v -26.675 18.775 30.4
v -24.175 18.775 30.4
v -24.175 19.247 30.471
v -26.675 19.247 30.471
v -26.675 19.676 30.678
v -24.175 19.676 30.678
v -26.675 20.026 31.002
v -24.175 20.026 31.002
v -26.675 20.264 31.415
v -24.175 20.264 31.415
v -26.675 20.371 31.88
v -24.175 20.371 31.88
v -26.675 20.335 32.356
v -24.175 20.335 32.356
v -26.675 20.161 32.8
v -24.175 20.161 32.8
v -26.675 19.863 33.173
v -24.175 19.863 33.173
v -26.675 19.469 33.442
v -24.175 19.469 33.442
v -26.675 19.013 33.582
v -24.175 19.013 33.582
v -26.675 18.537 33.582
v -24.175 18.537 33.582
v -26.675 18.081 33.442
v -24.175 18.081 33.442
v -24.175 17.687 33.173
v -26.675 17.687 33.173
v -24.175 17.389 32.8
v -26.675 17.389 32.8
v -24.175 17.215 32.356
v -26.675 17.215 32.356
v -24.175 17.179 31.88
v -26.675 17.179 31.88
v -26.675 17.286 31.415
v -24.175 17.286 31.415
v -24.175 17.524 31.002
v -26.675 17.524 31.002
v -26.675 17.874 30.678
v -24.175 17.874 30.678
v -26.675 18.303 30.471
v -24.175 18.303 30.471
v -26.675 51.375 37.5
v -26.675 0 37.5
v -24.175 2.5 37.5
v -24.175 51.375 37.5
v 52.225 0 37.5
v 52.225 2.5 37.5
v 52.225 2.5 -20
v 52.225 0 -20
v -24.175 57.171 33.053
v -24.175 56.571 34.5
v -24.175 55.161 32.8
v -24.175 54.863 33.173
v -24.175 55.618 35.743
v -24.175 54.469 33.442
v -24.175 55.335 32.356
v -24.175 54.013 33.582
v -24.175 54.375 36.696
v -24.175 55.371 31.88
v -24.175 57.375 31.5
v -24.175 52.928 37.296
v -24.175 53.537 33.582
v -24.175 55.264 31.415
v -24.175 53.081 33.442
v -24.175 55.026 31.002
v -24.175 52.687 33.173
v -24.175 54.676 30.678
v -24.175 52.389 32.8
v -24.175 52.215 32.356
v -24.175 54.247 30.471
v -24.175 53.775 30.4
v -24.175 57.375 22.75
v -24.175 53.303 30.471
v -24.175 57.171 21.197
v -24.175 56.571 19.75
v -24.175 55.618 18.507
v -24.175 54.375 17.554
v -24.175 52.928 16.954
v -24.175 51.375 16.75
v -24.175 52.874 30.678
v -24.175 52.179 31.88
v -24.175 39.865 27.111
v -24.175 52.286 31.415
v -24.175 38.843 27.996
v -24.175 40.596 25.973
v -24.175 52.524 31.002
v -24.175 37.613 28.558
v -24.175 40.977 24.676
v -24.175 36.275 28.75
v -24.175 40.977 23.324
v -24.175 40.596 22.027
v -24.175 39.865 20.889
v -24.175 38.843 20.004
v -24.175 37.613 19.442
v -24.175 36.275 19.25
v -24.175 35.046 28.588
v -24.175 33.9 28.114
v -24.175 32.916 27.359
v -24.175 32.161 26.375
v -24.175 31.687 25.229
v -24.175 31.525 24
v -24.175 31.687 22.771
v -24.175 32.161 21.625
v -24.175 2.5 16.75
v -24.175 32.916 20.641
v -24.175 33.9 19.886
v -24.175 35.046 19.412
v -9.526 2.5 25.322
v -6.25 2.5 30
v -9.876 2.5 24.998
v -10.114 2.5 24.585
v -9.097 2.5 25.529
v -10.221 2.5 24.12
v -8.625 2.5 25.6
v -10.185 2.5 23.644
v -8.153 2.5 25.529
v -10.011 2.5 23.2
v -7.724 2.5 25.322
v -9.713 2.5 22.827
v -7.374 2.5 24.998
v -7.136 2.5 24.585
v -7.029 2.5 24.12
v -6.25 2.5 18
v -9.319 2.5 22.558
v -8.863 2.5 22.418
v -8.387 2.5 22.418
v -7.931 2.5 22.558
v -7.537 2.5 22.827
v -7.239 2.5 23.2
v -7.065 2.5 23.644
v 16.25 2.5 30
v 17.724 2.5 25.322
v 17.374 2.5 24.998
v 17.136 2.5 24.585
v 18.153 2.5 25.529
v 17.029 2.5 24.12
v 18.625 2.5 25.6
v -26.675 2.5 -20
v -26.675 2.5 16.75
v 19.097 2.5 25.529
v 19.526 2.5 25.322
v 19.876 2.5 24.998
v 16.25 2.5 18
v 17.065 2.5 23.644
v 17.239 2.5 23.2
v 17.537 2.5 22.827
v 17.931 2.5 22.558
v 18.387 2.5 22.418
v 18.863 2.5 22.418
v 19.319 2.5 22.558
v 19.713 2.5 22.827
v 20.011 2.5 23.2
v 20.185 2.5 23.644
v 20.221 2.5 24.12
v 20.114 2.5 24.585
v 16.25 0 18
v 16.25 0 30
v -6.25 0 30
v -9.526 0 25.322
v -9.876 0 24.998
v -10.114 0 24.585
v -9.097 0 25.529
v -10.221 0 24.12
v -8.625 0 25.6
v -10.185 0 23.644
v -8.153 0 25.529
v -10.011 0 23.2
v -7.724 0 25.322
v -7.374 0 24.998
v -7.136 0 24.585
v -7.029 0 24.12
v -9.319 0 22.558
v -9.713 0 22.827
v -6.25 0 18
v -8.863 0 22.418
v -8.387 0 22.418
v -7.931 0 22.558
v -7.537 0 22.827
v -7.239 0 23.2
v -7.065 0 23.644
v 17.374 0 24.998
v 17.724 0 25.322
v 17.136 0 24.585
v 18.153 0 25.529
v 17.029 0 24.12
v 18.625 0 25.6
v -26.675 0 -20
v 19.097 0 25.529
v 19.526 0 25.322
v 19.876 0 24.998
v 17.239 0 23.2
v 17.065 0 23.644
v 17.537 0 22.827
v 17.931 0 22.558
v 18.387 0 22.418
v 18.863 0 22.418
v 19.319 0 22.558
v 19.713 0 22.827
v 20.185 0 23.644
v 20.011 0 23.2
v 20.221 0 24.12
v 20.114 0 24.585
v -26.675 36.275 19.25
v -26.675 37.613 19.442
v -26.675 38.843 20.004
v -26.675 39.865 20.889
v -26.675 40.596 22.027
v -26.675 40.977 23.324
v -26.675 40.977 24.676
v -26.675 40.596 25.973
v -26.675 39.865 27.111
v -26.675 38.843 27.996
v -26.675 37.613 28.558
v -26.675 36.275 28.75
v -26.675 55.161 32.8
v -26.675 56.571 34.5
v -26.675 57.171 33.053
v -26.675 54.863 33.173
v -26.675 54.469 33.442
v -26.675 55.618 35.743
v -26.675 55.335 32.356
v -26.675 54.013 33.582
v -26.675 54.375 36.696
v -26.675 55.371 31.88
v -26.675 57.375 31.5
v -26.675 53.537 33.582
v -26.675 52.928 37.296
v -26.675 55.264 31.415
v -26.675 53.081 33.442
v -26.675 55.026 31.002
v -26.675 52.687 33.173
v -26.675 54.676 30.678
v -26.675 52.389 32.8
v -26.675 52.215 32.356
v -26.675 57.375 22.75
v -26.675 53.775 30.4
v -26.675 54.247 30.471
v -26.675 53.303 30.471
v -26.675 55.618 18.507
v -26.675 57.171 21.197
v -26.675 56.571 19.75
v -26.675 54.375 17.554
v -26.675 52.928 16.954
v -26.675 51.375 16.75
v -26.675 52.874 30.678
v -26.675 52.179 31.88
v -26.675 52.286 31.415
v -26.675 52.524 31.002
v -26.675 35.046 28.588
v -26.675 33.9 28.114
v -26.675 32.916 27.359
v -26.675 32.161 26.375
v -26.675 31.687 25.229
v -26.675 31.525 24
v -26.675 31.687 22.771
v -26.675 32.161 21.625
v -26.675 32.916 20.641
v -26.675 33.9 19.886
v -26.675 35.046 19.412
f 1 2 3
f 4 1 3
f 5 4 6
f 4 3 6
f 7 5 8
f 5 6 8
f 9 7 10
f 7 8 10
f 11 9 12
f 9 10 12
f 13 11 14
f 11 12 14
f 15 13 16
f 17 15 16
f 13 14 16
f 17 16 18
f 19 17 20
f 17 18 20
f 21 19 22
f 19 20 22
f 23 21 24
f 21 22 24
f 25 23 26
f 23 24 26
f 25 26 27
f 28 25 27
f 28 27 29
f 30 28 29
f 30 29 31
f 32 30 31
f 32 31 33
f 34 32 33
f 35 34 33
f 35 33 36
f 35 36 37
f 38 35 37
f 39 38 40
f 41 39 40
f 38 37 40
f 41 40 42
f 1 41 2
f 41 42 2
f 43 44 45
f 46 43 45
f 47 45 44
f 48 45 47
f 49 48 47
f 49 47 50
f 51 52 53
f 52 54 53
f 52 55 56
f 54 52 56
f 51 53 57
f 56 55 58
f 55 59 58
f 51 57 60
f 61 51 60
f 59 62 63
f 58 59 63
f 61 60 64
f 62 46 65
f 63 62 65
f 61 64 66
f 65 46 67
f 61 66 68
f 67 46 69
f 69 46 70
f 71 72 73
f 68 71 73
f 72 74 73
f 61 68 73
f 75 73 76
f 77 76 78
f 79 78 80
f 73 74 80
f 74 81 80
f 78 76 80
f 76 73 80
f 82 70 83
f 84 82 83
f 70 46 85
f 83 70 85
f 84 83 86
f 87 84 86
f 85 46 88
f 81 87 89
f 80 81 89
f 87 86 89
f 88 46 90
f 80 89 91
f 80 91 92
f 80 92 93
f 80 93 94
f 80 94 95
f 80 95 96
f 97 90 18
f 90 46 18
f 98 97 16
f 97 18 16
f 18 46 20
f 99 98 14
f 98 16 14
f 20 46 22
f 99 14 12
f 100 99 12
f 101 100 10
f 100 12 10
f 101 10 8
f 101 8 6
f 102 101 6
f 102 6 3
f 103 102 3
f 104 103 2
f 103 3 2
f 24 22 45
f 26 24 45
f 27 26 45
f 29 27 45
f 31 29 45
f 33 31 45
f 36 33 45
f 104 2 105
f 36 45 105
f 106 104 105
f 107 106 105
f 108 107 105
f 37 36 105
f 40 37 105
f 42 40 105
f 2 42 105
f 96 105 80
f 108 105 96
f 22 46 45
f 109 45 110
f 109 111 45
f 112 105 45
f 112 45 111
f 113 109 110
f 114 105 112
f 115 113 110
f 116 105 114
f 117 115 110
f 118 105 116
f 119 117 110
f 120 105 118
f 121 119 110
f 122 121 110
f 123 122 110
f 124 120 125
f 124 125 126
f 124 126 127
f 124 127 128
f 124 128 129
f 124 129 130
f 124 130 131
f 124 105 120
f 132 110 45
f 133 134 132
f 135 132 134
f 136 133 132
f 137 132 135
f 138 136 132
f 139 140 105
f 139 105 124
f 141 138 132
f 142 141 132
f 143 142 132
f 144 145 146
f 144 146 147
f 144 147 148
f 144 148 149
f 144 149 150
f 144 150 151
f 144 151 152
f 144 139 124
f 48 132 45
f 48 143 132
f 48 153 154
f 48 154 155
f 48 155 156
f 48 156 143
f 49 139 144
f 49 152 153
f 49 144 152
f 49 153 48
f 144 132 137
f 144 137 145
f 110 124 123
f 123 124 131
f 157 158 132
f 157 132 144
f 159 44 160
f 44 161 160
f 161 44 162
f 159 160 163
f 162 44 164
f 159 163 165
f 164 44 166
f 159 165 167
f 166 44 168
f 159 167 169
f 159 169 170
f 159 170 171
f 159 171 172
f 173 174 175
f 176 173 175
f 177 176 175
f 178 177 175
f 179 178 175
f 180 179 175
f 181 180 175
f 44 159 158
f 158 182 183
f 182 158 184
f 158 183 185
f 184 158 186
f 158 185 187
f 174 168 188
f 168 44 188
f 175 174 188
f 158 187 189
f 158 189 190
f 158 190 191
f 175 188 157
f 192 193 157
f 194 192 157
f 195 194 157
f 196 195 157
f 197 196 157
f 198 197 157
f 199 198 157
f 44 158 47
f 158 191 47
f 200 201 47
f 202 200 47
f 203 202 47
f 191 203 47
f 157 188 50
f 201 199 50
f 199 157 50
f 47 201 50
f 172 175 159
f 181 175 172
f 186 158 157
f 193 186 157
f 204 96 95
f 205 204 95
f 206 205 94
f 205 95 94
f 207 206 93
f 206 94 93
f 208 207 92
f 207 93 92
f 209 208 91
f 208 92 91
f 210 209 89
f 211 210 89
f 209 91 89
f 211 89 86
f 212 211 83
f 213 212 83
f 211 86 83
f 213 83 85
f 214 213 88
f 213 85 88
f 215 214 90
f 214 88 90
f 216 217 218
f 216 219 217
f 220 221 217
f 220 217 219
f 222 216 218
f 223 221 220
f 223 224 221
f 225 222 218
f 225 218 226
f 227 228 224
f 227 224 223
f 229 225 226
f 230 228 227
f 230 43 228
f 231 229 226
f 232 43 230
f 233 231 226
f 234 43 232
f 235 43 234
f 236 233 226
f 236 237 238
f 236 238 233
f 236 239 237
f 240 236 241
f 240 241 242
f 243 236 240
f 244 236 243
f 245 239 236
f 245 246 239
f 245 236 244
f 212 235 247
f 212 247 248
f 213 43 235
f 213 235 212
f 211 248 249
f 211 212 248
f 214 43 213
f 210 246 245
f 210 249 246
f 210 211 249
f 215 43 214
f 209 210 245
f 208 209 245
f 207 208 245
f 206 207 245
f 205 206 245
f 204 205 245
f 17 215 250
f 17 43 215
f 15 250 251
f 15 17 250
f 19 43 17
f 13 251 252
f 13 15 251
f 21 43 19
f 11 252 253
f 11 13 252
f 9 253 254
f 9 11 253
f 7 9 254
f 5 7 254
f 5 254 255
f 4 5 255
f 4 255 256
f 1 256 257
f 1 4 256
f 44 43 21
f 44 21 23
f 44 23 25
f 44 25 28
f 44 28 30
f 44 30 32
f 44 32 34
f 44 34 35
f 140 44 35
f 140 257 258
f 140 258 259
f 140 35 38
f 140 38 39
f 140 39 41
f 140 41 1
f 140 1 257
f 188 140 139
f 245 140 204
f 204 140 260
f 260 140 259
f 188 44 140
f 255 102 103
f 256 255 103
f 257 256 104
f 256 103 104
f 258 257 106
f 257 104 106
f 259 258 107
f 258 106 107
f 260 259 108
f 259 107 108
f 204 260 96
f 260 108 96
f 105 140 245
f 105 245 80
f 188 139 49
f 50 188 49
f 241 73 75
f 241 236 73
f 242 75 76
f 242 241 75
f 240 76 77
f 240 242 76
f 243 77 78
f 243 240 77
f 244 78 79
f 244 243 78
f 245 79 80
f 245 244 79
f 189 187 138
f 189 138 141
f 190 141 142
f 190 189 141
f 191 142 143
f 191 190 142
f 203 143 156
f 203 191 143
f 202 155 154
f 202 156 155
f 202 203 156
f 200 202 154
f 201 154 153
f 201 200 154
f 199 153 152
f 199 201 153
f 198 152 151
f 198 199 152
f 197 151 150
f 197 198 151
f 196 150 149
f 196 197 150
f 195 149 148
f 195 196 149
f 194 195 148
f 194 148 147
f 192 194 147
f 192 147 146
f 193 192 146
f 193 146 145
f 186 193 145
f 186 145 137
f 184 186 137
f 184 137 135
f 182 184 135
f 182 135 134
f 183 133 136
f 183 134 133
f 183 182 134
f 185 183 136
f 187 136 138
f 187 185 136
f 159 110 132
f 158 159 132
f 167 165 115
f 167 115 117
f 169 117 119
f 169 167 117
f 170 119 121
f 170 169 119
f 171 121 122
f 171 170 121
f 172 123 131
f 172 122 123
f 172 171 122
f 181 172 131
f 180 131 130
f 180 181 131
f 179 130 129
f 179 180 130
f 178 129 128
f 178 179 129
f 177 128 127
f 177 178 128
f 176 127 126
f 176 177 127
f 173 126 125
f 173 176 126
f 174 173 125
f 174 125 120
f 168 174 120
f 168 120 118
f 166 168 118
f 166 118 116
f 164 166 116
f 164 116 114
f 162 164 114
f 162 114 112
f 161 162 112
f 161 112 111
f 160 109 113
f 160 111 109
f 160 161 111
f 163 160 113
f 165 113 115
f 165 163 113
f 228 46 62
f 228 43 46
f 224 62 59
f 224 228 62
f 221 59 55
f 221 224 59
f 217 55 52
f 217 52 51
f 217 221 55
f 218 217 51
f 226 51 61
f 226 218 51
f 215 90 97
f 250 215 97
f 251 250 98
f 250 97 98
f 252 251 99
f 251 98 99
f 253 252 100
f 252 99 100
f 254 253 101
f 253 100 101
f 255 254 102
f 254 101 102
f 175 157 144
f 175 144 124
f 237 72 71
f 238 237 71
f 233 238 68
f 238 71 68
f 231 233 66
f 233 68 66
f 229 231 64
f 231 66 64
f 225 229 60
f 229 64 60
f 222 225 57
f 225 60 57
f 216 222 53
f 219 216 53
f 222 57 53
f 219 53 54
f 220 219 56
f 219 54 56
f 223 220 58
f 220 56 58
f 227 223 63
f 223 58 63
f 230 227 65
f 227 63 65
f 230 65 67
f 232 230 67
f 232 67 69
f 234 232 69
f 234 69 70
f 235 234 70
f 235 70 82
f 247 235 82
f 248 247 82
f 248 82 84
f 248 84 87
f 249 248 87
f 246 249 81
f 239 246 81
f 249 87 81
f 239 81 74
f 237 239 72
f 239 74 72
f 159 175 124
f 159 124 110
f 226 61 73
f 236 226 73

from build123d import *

# Parameters (mm, degrees)
SKETCH1_W               = 80
SKETCH1_H               = 60
BOSS_EXTRUDE1_DEPTH     = 2.5
CUT_EXTRUDE4_DEPTH      = 51.062460986
CUT_EXTRUDE4_DEPTH_BACK = 51.062460986
SKETCH2_R               = 1.6
SKETCH3_W               = 2.5
SKETCH3_H               = 20.5
BOSS_EXTRUDE2_DEPTH     = 66.5
SKETCH4_W               = 80
SKETCH4_H               = 5.5
BOSS_EXTRUDE3_DEPTH     = 2.5
SKETCH5_W               = 2.5
SKETCH5_H               = 5.5
BOSS_EXTRUDE4_DEPTH     = 66.5
SKETCH6_W               = 2.5
SKETCH6_H               = 5.5
CUT_EXTRUDE5_DEPTH      = 66.5
SKETCH9_W               = 2.5
SKETCH9_H               = 2.5
BOSS_EXTRUDE5_DEPTH     = 66.5
SKETCH11_R              = 4.75
CUT_EXTRUDE6_DEPTH      = 2.5
SKETCH15_W              = 2.5
SKETCH15_H              = 23
BOSS_EXTRUDE6_DEPTH     = 8
SKETCH17_W              = 2.5
SKETCH17_H              = 74.5
BOSS_EXTRUDE7_DEPTH     = 2
SKETCH18_R              = 1.6
CUT_EXTRUDE7_DEPTH      = 2.5
SKETCH21_W              = 80
SKETCH21_H              = 2.5
BOSS_EXTRUDE8_DEPTH     = 2
SKETCH22_W              = 4.25
SKETCH22_H              = 74.5
CUT_EXTRUDE8_DEPTH      = 2.5
FILLET1_R               = 5
SKETCH23_W              = 15.225
SKETCH23_H              = 67.5
BOSS_EXTRUDE10_DEPTH    = 2.5
SKETCH24_W              = 95.225
SKETCH24_H              = 10
CUT_EXTRUDE9_DEPTH      = 101.031498164
SKETCH26_W              = 2.5
SKETCH26_H              = 20.75
BOSS_EXTRUDE11_DEPTH    = 74.5
SKETCH27_R              = 1.6
CUT_EXTRUDE10_DEPTH     = 2.5
SKETCH28_W              = 2.5
SKETCH28_H              = 20.75
CUT_EXTRUDE11_DEPTH     = 74.5
SKETCH29_W              = 20.75
SKETCH29_H              = 19.625
CUT_EXTRUDE12_DEPTH     = 2.5
FILLET2_R               = 6
SKETCH31_W              = 13.325
SKETCH31_H              = 57.5
CUT_EXTRUDE13_DEPTH     = 2.5
SKETCH33_W              = 3
SKETCH33_H              = 57.5
CUT_EXTRUDE14_DEPTH     = 2.5


with BuildPart() as part:
    # Sketch1 → Boss-Extrude1 (new body)
    with BuildSketch(Plane(origin=(0, 0, 0), x_dir=(1, 0, 0), z_dir=(0, 1, 0))):
        Rectangle(SKETCH1_W, SKETCH1_H)
    extrude(amount=BOSS_EXTRUDE1_DEPTH)

    # Sketch2 → Cut-Extrude4 (cut, two sides: drawn at the far end of the back side and taken through both)
    with BuildSketch(Plane(origin=(0, 0, 0), x_dir=(1, 0, 0), z_dir=(0, 1, 0)).offset(-CUT_EXTRUDE4_DEPTH_BACK)):
        with BuildLine():
            Line((-6.25, -24), (-2.5, -24))
            ThreePointArc((-2.5, -24), (0, -21.5), (2.5, -24))
            Line((2.5, -24), (16.25, -24))
            Line((16.25, -24), (16.25, -18))
            Line((16.25, -18), (-6.25, -18))
            Line((-6.25, -18), (-6.25, -24))
        make_face()
        with BuildLine():
            Line((0, -26.5), (0, -30))
            Line((0, -30), (16.25, -30))
            Line((16.25, -30), (16.25, -24))
            Line((16.25, -24), (2.5, -24))
            ThreePointArc((2.5, -24), (1.767766953, -25.767766953), (0, -26.5))
        make_face()
        with BuildLine():
            ThreePointArc((-2.5, -24), (-1.767766953, -25.767766953), (0, -26.5))
            Line((0, -26.5), (0, -24))
            Line((0, -24), (-2.5, -24))
        make_face()
        with BuildLine():
            Line((0, -24), (0, -26.5))
            ThreePointArc((0, -26.5), (1.767766953, -25.767766953), (2.5, -24))
            Line((2.5, -24), (0, -24))
        make_face()
        with BuildLine():
            Line((-2.5, -24), (0, -24))
            Line((0, -24), (2.5, -24))
            ThreePointArc((2.5, -24), (0, -21.5), (-2.5, -24))
        make_face()
        with BuildLine():
            ThreePointArc((-2.5, -24), (-1.767766953, -25.767766953), (0, -26.5))
            Line((0, -26.5), (0, -24))
            Line((0, -24), (-2.5, -24))
        make_face()
        with BuildLine():
            Line((0, -24), (0, -26.5))
            ThreePointArc((0, -26.5), (1.767766953, -25.767766953), (2.5, -24))
            Line((2.5, -24), (0, -24))
        make_face()
        with BuildLine():
            Line((-6.25, -30), (0, -30))
            Line((0, -30), (0, -26.5))
            ThreePointArc((0, -26.5), (-1.767766953, -25.767766953), (-2.5, -24))
            Line((-2.5, -24), (-6.25, -24))
            Line((-6.25, -24), (-6.25, -30))
        make_face()
        with Locations(Location((-8.625, -24, 0), (0, 0, 270))):
            Circle(SKETCH2_R)
        with Locations(Location((18.625, -24, 0), (0, 0, 270))):
            Circle(SKETCH2_R)
    extrude(amount=CUT_EXTRUDE4_DEPTH + CUT_EXTRUDE4_DEPTH_BACK, mode=Mode.SUBTRACT)

    # Sketch3 → Boss-Extrude2 (add)
    with BuildSketch(Plane(origin=(0, 2.5, 0), x_dir=(1, 0, 0), z_dir=(0, 1, 0))):
        with Locations((-38.75, -19.75)):
            Rectangle(SKETCH3_W, SKETCH3_H)
    extrude(amount=BOSS_EXTRUDE2_DEPTH)

    # Sketch4 → Boss-Extrude3 (add)
    with BuildSketch(Plane(origin=(0, 2.5, 0), x_dir=(1, 0, 0), z_dir=(0, 1, 0))):
        with Locations((0, -32.75)):
            Rectangle(SKETCH4_W, SKETCH4_H)
    extrude(amount=-BOSS_EXTRUDE3_DEPTH)

    # Sketch5 → Boss-Extrude4 (add)
    with BuildSketch(Plane(origin=(0, 2.5, 0), x_dir=(1, 0, 0), z_dir=(0, 1, 0))):
        with Locations((-38.75, -32.75)):
            Rectangle(SKETCH5_W, SKETCH5_H)
    extrude(amount=BOSS_EXTRUDE4_DEPTH)

    # Sketch6 → Cut-Extrude5 (cut)
    with BuildSketch(Plane(origin=(0, 69, 0), x_dir=(1, 0, 0), z_dir=(0, 1, 0))):
        with Locations((-38.75, -12.25)):
            Rectangle(SKETCH6_W, SKETCH6_H)
    extrude(amount=-CUT_EXTRUDE5_DEPTH, mode=Mode.SUBTRACT)

    # Sketch9 → Boss-Extrude5 (add)
    with BuildSketch(Plane(origin=(0, 2.5, 0), x_dir=(1, 0, 0), z_dir=(0, 1, 0))):
        with Locations((-38.75, -13.75)):
            Rectangle(SKETCH9_W, SKETCH9_H)
    extrude(amount=BOSS_EXTRUDE5_DEPTH)

    # Sketch11 → Cut-Extrude6 (cut)
    with BuildSketch(Plane(origin=(-37.5, 0, 0), x_dir=(0, 0, -1), z_dir=(1, 0, 0))):
        with Locations((-24, 54)):
            Circle(SKETCH11_R)
    extrude(amount=-CUT_EXTRUDE6_DEPTH, mode=Mode.SUBTRACT)

    # Sketch15 → Boss-Extrude6 (add)
    with BuildSketch(Plane(origin=(0, 69, 0), x_dir=(1, 0, 0), z_dir=(0, 1, 0))):
        with Locations((-38.75, -24)):
            Rectangle(SKETCH15_W, SKETCH15_H)
    extrude(amount=BOSS_EXTRUDE6_DEPTH)

    # Sketch17 → Boss-Extrude7 (add)
    with BuildSketch(Plane.XY.offset(35.5)):
        with Locations((-38.75, 39.75)):
            Rectangle(SKETCH17_W, SKETCH17_H)
    extrude(amount=BOSS_EXTRUDE7_DEPTH)

    # Sketch18 → Cut-Extrude7 (cut)
    with BuildSketch(Plane.ZY.offset(40)):
        with Locations((32, 36.5)):
            Circle(SKETCH18_R)
        with Locations((32, 71.5)):
            Circle(SKETCH18_R)
    extrude(amount=-CUT_EXTRUDE7_DEPTH, mode=Mode.SUBTRACT)

    # Sketch21 → Boss-Extrude8 (add)
    with BuildSketch(Plane.XY.offset(35.5)):
        with Locations((0, 1.25)):
            Rectangle(SKETCH21_W, SKETCH21_H)
    extrude(amount=BOSS_EXTRUDE8_DEPTH)

    # Sketch22 → Cut-Extrude8 (cut)
    with BuildSketch(Plane(origin=(-37.5, 0, 0), x_dir=(0, 0, -1), z_dir=(1, 0, 0))):
        with Locations((-14.625, 39.75)):
            Rectangle(SKETCH22_W, SKETCH22_H)
    extrude(amount=-CUT_EXTRUDE8_DEPTH, mode=Mode.SUBTRACT)

    # Fillet1
    fillet1_edges = [part.edges().sort_by_distance(p)[0] for p in [
        (-38.75, 77, 37.5),
        (-38.75, 77, 16.75),
    ]]
    fillet(fillet1_edges, radius=FILLET1_R)

    # Sketch23 → Boss-Extrude10 (add)
    with BuildSketch(Plane(origin=(0, 2.5, 0), x_dir=(1, 0, 0), z_dir=(0, 1, 0))):
        with Locations((47.6125, -3.75)):
            Rectangle(SKETCH23_W, SKETCH23_H)
    extrude(amount=-BOSS_EXTRUDE10_DEPTH)

    # Sketch24 → Cut-Extrude9 (cut, through all)
    with BuildSketch(Plane(origin=(0, 2.5, 0), x_dir=(1, 0, 0), z_dir=(0, 1, 0))):
        with Locations((7.6125, 25)):
            Rectangle(SKETCH24_W, SKETCH24_H)
    extrude(amount=-CUT_EXTRUDE9_DEPTH, mode=Mode.SUBTRACT)

    # Sketch26 → Boss-Extrude11 (add)
    with BuildSketch(Plane(origin=(0, 2.5, 0), x_dir=(1, 0, 0), z_dir=(0, 1, 0))):
        with Locations((-25.425, -27.125)):
            Rectangle(SKETCH26_W, SKETCH26_H)
    extrude(amount=BOSS_EXTRUDE11_DEPTH)

    # Sketch27 → Cut-Extrude10 (cut)
    with BuildSketch(Plane(origin=(-24.175, 0, 0), x_dir=(0, 0, -1), z_dir=(1, 0, 0))):
        with BuildLine():
            ThreePointArc((-28.75, 36.275), (-27.358757211, 32.916242789), (-24, 31.525))
            Line((-24, 31.525), (-24, 36.275))
            Line((-24, 36.275), (-28.75, 36.275))
        make_face()
        with BuildLine():
            Line((-24, 36.275), (-24, 31.525))
            ThreePointArc((-24, 31.525), (-20.641242789, 32.916242789), (-19.25, 36.275))
            ThreePointArc((-19.25, 36.275), (-24, 41.025), (-28.75, 36.275))
            Line((-28.75, 36.275), (-24, 36.275))
        make_face()
        with BuildLine():
            ThreePointArc((-28.75, 36.275), (-27.358757211, 32.916242789), (-24, 31.525))
            Line((-24, 31.525), (-24, 36.275))
            Line((-24, 36.275), (-28.75, 36.275))
        make_face()
        with BuildLine():
            Line((-24, 36.275), (-24, 31.525))
            ThreePointArc((-24, 31.525), (-20.641242789, 32.916242789), (-19.25, 36.275))
            ThreePointArc((-19.25, 36.275), (-24, 41.025), (-28.75, 36.275))
            Line((-28.75, 36.275), (-24, 36.275))
        make_face()
        with Locations((-32, 18.775)):
            Circle(SKETCH27_R)
        with Locations((-32, 53.775)):
            Circle(SKETCH27_R)
    extrude(amount=-CUT_EXTRUDE10_DEPTH, mode=Mode.SUBTRACT)

    # Sketch28 → Cut-Extrude11 (cut)
    with BuildSketch(Plane(origin=(0, 77, 0), x_dir=(1, 0, 0), z_dir=(0, 1, 0))):
        with Locations((-38.75, -27.125)):
            Rectangle(SKETCH28_W, SKETCH28_H)
    extrude(amount=-CUT_EXTRUDE11_DEPTH, mode=Mode.SUBTRACT)

    # Sketch29 → Cut-Extrude12 (cut)
    with BuildSketch(Plane(origin=(-24.175, 0, 0), x_dir=(0, 0, -1), z_dir=(1, 0, 0))):
        with Locations((-27.125, 67.1875)):
            Rectangle(SKETCH29_W, SKETCH29_H)
    extrude(amount=-CUT_EXTRUDE12_DEPTH, mode=Mode.SUBTRACT)

    # Fillet2
    fillet2_edges = [part.edges().sort_by_distance(p)[0] for p in [
        (-25.425, 57.375, 37.5),
        (-25.425, 57.375, 16.75),
    ]]
    fillet(fillet2_edges, radius=FILLET2_R)

    # Sketch31 → Cut-Extrude13 (cut)
    with BuildSketch(Plane(origin=(0, 2.5, 0), x_dir=(1, 0, 0), z_dir=(0, 1, 0))):
        with Locations((-33.3375, -8.75)):
            Rectangle(SKETCH31_W, SKETCH31_H)
    extrude(amount=-CUT_EXTRUDE13_DEPTH, mode=Mode.SUBTRACT)

    # Sketch33 → Cut-Extrude14 (cut)
    with BuildSketch(Plane(origin=(0, 2.5, 0), x_dir=(1, 0, 0), z_dir=(0, 1, 0))):
        with Locations((53.725, -8.75)):
            Rectangle(SKETCH33_W, SKETCH33_H)
    extrude(amount=-CUT_EXTRUDE14_DEPTH, mode=Mode.SUBTRACT)


solid = part.part
